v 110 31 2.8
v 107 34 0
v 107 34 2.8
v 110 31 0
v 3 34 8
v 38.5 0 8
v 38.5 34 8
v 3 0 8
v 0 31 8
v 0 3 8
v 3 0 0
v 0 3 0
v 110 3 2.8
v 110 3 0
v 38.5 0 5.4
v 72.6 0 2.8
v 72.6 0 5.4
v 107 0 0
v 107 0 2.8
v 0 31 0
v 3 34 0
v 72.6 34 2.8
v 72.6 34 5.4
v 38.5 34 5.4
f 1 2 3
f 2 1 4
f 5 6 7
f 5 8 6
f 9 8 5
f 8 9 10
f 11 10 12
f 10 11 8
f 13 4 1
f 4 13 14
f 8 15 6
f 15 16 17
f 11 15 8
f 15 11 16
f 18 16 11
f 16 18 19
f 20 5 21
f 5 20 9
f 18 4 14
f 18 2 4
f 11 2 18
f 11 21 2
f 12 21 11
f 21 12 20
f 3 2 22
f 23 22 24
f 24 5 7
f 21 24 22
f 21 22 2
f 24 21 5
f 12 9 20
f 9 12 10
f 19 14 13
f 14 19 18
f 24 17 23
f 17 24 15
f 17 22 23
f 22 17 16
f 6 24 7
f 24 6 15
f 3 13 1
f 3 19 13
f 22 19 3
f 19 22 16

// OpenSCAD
$fn = 32;

// ----------------------------------------------------------------------
// Stepped bar: twostep, 110 x 34 x 8/2.8 mm
// ----------------------------------------------------------------------

// --- parameters (mm) ---
bar_l = 110;              // bar length, X
bar_w = 34;               // bar width, Y
plate_t = 8;              // thickness of the thick zone, Z
thin_t = 2.8;             // thickness of the thin zone
corner_c = 3;             // corner chamfer of the bar
step_cut = 5.2;           // material removed from the thin zone
stair1_x = 38.5;          // position of the first stair
stair2_x = 72.6;          // position of the second stair
mid_t = 5.4;              // thickness of the middle zone
depth_1 = 2.6;            // depth of cut 1 from the top face
depth_2 = 5.2;            // depth of cut 2 from the top face

profile = [[3, 0], [107, 0], [110, 3], [110, 31], [107, 34], [3, 34], [0, 31], [0, 3]];  // primary outline, 8 points, counter clockwise
void_1 = [[38.5, -1], [72.6, -1], [72.6, 35], [38.5, 35]];  // first stair, 4 points
void_2 = [[72.6, -1], [111, -1], [111, 35], [72.6, 35]];  // second stair, 4 points

// --- the one profile operation ---
difference() {
  linear_extrude(height = plate_t) polygon(points = profile);
  translate([0, 0, plate_t - depth_1])
    linear_extrude(height = depth_1 + 1) polygon(points = void_1);
  translate([0, 0, plate_t - depth_2])
    linear_extrude(height = depth_2 + 1) polygon(points = void_2);
}
